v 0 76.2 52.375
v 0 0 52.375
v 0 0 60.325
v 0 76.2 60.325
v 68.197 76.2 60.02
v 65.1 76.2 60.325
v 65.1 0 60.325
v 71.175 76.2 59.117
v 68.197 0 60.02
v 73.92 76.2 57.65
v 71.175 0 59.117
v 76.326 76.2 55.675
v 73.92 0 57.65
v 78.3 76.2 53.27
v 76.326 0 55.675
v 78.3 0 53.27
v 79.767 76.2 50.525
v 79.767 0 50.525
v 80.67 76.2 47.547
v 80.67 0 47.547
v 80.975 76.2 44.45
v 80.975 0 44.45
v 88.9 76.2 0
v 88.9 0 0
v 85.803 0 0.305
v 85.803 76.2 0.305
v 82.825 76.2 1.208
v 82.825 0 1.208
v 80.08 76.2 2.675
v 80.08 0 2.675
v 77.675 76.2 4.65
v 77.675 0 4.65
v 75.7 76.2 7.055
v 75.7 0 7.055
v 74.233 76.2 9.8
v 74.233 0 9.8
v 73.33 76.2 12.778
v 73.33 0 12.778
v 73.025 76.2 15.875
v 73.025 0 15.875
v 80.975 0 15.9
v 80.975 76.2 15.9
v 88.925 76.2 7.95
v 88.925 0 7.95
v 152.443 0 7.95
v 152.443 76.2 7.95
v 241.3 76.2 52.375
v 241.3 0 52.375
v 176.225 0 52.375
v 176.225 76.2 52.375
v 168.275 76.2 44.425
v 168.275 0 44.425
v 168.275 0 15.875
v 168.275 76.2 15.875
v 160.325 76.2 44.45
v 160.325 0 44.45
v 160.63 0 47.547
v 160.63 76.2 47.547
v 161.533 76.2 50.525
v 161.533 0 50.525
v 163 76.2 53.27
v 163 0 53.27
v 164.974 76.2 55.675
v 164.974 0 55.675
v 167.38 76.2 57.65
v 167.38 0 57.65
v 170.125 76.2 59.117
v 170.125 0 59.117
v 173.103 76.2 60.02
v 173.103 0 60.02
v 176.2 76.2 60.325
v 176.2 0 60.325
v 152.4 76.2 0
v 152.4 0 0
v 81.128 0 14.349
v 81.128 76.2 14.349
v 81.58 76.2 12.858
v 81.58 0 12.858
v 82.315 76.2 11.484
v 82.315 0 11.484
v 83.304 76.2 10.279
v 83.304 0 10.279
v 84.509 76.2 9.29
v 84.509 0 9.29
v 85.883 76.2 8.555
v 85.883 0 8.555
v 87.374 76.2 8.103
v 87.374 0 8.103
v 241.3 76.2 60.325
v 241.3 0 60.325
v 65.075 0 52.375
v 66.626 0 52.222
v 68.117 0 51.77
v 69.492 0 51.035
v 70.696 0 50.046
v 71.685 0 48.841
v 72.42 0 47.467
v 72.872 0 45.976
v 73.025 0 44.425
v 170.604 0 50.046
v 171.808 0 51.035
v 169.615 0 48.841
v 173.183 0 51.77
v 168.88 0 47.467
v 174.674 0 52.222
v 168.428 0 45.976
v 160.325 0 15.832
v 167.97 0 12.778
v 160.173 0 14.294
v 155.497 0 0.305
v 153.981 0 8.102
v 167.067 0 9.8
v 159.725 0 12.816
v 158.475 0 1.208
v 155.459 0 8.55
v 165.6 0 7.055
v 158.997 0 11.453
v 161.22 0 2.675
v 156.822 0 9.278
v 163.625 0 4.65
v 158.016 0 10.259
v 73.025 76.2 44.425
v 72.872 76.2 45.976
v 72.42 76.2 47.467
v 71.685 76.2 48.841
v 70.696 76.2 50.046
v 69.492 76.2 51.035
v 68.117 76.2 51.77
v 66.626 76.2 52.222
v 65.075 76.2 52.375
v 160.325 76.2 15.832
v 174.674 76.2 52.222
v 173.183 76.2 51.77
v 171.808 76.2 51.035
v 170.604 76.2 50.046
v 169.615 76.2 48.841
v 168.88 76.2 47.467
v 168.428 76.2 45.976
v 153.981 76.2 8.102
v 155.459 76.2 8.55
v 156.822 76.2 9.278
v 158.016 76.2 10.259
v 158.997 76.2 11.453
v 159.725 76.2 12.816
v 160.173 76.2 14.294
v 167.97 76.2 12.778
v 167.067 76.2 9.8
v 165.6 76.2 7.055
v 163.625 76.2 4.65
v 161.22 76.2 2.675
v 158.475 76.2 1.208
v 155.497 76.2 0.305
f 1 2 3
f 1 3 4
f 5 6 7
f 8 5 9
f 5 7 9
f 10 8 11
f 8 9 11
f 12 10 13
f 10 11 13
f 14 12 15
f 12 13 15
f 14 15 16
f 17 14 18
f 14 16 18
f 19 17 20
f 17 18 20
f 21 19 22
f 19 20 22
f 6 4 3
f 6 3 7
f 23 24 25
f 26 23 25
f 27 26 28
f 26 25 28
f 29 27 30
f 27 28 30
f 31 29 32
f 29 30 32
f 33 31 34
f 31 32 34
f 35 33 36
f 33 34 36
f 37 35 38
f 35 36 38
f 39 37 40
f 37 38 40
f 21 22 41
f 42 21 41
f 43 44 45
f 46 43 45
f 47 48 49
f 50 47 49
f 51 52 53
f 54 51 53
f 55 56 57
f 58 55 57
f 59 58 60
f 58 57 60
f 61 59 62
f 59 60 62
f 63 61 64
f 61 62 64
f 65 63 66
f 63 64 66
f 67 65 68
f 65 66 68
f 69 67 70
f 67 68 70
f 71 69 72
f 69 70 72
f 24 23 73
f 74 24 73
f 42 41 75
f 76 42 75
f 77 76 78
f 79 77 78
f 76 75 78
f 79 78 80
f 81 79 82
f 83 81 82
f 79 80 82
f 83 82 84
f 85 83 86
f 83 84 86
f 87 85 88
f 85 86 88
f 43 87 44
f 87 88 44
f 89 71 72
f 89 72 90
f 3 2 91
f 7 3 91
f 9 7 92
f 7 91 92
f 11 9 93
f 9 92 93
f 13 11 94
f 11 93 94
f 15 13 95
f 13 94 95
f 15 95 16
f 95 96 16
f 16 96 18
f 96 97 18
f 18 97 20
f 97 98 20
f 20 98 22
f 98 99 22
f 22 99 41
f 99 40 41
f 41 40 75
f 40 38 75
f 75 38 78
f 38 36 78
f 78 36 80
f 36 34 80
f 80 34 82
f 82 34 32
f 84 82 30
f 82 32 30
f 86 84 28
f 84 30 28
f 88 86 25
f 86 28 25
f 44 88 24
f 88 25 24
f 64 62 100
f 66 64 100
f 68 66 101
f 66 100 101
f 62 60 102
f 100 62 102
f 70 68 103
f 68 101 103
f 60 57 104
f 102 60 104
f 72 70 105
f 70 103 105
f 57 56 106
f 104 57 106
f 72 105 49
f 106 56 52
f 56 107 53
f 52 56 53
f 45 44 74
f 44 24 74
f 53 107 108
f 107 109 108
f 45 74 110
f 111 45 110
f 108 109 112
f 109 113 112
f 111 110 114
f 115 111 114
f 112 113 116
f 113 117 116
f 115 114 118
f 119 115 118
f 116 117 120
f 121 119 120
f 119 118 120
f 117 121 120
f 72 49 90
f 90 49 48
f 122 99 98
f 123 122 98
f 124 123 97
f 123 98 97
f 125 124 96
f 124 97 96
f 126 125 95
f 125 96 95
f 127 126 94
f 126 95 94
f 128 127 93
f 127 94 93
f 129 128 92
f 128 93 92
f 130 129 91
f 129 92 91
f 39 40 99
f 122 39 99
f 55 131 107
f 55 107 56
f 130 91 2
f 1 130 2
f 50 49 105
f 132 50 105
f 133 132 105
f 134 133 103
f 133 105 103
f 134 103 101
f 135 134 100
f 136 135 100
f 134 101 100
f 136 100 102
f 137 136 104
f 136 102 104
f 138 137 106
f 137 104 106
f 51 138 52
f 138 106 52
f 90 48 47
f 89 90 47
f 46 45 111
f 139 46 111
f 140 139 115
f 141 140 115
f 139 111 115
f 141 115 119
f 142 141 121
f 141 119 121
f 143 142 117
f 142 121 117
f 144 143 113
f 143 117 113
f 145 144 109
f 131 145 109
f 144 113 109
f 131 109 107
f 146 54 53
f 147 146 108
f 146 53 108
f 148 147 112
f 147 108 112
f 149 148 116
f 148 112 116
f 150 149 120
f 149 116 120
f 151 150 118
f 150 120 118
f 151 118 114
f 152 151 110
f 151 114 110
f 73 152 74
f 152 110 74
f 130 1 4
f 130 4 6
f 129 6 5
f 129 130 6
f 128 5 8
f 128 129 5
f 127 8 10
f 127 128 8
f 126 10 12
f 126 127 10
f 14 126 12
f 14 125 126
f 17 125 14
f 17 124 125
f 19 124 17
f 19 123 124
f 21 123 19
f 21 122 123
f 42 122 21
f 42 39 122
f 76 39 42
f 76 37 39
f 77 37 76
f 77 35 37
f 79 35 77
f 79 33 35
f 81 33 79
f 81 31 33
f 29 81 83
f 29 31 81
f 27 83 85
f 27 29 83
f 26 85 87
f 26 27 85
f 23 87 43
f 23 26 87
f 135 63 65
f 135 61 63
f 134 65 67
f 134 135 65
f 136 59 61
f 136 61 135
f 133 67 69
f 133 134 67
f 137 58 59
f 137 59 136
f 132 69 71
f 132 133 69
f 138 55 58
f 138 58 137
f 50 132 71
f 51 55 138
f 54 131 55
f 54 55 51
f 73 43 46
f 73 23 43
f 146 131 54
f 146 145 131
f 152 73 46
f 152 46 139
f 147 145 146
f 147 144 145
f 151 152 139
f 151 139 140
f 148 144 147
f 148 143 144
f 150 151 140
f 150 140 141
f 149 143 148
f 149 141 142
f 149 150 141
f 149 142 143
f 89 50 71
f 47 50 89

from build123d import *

# Parameters (mm, degrees)
F0_W     = 241.3
F0_H     = 76.2
F1_DEPTH = 60.325
F3_DEPTH = 76.201


with BuildPart() as f1:
    # F0 (on Top) → F1 (new body)
    with BuildSketch(Plane.XY):
        with Locations((120.65, 38.1)):
            Rectangle(F0_W, F0_H)
    extrude(amount=F1_DEPTH)

    # F2 (on Front) → F3 (cut, through all)
    with BuildSketch(Plane.XZ):
        with BuildLine():
            Line((65.0748, 52.3748), (0, 52.3748))
            Line((0, 52.3748), (0, 0))
            Line((0, 0), (88.9, 0))
            ThreePointArc((88.9, 0), (77.67468, 4.64968), (73.025, 15.875))
            Line((73.025, 15.875), (73.025, 44.4246))
            ThreePointArc((73.025, 44.4246), (70.69644, 50.04624), (65.0748, 52.3748))
        make_face()
        with BuildLine():
            Line((176.1998, 60.325), (65.1002, 60.325))
            ThreePointArc((65.1002, 60.325), (76.32552, 55.67532), (80.9752, 44.45))
            Line((80.9752, 44.45), (80.9752, 15.9004))
            ThreePointArc((80.9752, 15.9004), (83.30376, 10.27876), (88.9254, 7.9502))
            Line((88.9254, 7.9502), (152.44318, 7.9502))
            ThreePointArc((152.44318, 7.9502), (158.016327, 10.258673), (160.3248, 15.83182))
            Line((160.3248, 15.83182), (160.3248, 44.45))
            ThreePointArc((160.3248, 44.45), (164.97448, 55.67532), (176.1998, 60.325))
        make_face()
        with BuildLine():
            ThreePointArc((168.275, 15.875), (163.62532, 4.64968), (152.4, 0))
            Line((152.4, 0), (241.3, 0))
            Line((241.3, 0), (241.3, 52.3748))
            Line((241.3, 52.3748), (176.2252, 52.3748))
            ThreePointArc((176.2252, 52.3748), (170.60356, 50.04624), (168.275, 44.4246))
            Line((168.275, 44.4246), (168.275, 15.875))
        make_face()
    extrude(amount=-F3_DEPTH, mode=Mode.SUBTRACT)


solid = f1.part
